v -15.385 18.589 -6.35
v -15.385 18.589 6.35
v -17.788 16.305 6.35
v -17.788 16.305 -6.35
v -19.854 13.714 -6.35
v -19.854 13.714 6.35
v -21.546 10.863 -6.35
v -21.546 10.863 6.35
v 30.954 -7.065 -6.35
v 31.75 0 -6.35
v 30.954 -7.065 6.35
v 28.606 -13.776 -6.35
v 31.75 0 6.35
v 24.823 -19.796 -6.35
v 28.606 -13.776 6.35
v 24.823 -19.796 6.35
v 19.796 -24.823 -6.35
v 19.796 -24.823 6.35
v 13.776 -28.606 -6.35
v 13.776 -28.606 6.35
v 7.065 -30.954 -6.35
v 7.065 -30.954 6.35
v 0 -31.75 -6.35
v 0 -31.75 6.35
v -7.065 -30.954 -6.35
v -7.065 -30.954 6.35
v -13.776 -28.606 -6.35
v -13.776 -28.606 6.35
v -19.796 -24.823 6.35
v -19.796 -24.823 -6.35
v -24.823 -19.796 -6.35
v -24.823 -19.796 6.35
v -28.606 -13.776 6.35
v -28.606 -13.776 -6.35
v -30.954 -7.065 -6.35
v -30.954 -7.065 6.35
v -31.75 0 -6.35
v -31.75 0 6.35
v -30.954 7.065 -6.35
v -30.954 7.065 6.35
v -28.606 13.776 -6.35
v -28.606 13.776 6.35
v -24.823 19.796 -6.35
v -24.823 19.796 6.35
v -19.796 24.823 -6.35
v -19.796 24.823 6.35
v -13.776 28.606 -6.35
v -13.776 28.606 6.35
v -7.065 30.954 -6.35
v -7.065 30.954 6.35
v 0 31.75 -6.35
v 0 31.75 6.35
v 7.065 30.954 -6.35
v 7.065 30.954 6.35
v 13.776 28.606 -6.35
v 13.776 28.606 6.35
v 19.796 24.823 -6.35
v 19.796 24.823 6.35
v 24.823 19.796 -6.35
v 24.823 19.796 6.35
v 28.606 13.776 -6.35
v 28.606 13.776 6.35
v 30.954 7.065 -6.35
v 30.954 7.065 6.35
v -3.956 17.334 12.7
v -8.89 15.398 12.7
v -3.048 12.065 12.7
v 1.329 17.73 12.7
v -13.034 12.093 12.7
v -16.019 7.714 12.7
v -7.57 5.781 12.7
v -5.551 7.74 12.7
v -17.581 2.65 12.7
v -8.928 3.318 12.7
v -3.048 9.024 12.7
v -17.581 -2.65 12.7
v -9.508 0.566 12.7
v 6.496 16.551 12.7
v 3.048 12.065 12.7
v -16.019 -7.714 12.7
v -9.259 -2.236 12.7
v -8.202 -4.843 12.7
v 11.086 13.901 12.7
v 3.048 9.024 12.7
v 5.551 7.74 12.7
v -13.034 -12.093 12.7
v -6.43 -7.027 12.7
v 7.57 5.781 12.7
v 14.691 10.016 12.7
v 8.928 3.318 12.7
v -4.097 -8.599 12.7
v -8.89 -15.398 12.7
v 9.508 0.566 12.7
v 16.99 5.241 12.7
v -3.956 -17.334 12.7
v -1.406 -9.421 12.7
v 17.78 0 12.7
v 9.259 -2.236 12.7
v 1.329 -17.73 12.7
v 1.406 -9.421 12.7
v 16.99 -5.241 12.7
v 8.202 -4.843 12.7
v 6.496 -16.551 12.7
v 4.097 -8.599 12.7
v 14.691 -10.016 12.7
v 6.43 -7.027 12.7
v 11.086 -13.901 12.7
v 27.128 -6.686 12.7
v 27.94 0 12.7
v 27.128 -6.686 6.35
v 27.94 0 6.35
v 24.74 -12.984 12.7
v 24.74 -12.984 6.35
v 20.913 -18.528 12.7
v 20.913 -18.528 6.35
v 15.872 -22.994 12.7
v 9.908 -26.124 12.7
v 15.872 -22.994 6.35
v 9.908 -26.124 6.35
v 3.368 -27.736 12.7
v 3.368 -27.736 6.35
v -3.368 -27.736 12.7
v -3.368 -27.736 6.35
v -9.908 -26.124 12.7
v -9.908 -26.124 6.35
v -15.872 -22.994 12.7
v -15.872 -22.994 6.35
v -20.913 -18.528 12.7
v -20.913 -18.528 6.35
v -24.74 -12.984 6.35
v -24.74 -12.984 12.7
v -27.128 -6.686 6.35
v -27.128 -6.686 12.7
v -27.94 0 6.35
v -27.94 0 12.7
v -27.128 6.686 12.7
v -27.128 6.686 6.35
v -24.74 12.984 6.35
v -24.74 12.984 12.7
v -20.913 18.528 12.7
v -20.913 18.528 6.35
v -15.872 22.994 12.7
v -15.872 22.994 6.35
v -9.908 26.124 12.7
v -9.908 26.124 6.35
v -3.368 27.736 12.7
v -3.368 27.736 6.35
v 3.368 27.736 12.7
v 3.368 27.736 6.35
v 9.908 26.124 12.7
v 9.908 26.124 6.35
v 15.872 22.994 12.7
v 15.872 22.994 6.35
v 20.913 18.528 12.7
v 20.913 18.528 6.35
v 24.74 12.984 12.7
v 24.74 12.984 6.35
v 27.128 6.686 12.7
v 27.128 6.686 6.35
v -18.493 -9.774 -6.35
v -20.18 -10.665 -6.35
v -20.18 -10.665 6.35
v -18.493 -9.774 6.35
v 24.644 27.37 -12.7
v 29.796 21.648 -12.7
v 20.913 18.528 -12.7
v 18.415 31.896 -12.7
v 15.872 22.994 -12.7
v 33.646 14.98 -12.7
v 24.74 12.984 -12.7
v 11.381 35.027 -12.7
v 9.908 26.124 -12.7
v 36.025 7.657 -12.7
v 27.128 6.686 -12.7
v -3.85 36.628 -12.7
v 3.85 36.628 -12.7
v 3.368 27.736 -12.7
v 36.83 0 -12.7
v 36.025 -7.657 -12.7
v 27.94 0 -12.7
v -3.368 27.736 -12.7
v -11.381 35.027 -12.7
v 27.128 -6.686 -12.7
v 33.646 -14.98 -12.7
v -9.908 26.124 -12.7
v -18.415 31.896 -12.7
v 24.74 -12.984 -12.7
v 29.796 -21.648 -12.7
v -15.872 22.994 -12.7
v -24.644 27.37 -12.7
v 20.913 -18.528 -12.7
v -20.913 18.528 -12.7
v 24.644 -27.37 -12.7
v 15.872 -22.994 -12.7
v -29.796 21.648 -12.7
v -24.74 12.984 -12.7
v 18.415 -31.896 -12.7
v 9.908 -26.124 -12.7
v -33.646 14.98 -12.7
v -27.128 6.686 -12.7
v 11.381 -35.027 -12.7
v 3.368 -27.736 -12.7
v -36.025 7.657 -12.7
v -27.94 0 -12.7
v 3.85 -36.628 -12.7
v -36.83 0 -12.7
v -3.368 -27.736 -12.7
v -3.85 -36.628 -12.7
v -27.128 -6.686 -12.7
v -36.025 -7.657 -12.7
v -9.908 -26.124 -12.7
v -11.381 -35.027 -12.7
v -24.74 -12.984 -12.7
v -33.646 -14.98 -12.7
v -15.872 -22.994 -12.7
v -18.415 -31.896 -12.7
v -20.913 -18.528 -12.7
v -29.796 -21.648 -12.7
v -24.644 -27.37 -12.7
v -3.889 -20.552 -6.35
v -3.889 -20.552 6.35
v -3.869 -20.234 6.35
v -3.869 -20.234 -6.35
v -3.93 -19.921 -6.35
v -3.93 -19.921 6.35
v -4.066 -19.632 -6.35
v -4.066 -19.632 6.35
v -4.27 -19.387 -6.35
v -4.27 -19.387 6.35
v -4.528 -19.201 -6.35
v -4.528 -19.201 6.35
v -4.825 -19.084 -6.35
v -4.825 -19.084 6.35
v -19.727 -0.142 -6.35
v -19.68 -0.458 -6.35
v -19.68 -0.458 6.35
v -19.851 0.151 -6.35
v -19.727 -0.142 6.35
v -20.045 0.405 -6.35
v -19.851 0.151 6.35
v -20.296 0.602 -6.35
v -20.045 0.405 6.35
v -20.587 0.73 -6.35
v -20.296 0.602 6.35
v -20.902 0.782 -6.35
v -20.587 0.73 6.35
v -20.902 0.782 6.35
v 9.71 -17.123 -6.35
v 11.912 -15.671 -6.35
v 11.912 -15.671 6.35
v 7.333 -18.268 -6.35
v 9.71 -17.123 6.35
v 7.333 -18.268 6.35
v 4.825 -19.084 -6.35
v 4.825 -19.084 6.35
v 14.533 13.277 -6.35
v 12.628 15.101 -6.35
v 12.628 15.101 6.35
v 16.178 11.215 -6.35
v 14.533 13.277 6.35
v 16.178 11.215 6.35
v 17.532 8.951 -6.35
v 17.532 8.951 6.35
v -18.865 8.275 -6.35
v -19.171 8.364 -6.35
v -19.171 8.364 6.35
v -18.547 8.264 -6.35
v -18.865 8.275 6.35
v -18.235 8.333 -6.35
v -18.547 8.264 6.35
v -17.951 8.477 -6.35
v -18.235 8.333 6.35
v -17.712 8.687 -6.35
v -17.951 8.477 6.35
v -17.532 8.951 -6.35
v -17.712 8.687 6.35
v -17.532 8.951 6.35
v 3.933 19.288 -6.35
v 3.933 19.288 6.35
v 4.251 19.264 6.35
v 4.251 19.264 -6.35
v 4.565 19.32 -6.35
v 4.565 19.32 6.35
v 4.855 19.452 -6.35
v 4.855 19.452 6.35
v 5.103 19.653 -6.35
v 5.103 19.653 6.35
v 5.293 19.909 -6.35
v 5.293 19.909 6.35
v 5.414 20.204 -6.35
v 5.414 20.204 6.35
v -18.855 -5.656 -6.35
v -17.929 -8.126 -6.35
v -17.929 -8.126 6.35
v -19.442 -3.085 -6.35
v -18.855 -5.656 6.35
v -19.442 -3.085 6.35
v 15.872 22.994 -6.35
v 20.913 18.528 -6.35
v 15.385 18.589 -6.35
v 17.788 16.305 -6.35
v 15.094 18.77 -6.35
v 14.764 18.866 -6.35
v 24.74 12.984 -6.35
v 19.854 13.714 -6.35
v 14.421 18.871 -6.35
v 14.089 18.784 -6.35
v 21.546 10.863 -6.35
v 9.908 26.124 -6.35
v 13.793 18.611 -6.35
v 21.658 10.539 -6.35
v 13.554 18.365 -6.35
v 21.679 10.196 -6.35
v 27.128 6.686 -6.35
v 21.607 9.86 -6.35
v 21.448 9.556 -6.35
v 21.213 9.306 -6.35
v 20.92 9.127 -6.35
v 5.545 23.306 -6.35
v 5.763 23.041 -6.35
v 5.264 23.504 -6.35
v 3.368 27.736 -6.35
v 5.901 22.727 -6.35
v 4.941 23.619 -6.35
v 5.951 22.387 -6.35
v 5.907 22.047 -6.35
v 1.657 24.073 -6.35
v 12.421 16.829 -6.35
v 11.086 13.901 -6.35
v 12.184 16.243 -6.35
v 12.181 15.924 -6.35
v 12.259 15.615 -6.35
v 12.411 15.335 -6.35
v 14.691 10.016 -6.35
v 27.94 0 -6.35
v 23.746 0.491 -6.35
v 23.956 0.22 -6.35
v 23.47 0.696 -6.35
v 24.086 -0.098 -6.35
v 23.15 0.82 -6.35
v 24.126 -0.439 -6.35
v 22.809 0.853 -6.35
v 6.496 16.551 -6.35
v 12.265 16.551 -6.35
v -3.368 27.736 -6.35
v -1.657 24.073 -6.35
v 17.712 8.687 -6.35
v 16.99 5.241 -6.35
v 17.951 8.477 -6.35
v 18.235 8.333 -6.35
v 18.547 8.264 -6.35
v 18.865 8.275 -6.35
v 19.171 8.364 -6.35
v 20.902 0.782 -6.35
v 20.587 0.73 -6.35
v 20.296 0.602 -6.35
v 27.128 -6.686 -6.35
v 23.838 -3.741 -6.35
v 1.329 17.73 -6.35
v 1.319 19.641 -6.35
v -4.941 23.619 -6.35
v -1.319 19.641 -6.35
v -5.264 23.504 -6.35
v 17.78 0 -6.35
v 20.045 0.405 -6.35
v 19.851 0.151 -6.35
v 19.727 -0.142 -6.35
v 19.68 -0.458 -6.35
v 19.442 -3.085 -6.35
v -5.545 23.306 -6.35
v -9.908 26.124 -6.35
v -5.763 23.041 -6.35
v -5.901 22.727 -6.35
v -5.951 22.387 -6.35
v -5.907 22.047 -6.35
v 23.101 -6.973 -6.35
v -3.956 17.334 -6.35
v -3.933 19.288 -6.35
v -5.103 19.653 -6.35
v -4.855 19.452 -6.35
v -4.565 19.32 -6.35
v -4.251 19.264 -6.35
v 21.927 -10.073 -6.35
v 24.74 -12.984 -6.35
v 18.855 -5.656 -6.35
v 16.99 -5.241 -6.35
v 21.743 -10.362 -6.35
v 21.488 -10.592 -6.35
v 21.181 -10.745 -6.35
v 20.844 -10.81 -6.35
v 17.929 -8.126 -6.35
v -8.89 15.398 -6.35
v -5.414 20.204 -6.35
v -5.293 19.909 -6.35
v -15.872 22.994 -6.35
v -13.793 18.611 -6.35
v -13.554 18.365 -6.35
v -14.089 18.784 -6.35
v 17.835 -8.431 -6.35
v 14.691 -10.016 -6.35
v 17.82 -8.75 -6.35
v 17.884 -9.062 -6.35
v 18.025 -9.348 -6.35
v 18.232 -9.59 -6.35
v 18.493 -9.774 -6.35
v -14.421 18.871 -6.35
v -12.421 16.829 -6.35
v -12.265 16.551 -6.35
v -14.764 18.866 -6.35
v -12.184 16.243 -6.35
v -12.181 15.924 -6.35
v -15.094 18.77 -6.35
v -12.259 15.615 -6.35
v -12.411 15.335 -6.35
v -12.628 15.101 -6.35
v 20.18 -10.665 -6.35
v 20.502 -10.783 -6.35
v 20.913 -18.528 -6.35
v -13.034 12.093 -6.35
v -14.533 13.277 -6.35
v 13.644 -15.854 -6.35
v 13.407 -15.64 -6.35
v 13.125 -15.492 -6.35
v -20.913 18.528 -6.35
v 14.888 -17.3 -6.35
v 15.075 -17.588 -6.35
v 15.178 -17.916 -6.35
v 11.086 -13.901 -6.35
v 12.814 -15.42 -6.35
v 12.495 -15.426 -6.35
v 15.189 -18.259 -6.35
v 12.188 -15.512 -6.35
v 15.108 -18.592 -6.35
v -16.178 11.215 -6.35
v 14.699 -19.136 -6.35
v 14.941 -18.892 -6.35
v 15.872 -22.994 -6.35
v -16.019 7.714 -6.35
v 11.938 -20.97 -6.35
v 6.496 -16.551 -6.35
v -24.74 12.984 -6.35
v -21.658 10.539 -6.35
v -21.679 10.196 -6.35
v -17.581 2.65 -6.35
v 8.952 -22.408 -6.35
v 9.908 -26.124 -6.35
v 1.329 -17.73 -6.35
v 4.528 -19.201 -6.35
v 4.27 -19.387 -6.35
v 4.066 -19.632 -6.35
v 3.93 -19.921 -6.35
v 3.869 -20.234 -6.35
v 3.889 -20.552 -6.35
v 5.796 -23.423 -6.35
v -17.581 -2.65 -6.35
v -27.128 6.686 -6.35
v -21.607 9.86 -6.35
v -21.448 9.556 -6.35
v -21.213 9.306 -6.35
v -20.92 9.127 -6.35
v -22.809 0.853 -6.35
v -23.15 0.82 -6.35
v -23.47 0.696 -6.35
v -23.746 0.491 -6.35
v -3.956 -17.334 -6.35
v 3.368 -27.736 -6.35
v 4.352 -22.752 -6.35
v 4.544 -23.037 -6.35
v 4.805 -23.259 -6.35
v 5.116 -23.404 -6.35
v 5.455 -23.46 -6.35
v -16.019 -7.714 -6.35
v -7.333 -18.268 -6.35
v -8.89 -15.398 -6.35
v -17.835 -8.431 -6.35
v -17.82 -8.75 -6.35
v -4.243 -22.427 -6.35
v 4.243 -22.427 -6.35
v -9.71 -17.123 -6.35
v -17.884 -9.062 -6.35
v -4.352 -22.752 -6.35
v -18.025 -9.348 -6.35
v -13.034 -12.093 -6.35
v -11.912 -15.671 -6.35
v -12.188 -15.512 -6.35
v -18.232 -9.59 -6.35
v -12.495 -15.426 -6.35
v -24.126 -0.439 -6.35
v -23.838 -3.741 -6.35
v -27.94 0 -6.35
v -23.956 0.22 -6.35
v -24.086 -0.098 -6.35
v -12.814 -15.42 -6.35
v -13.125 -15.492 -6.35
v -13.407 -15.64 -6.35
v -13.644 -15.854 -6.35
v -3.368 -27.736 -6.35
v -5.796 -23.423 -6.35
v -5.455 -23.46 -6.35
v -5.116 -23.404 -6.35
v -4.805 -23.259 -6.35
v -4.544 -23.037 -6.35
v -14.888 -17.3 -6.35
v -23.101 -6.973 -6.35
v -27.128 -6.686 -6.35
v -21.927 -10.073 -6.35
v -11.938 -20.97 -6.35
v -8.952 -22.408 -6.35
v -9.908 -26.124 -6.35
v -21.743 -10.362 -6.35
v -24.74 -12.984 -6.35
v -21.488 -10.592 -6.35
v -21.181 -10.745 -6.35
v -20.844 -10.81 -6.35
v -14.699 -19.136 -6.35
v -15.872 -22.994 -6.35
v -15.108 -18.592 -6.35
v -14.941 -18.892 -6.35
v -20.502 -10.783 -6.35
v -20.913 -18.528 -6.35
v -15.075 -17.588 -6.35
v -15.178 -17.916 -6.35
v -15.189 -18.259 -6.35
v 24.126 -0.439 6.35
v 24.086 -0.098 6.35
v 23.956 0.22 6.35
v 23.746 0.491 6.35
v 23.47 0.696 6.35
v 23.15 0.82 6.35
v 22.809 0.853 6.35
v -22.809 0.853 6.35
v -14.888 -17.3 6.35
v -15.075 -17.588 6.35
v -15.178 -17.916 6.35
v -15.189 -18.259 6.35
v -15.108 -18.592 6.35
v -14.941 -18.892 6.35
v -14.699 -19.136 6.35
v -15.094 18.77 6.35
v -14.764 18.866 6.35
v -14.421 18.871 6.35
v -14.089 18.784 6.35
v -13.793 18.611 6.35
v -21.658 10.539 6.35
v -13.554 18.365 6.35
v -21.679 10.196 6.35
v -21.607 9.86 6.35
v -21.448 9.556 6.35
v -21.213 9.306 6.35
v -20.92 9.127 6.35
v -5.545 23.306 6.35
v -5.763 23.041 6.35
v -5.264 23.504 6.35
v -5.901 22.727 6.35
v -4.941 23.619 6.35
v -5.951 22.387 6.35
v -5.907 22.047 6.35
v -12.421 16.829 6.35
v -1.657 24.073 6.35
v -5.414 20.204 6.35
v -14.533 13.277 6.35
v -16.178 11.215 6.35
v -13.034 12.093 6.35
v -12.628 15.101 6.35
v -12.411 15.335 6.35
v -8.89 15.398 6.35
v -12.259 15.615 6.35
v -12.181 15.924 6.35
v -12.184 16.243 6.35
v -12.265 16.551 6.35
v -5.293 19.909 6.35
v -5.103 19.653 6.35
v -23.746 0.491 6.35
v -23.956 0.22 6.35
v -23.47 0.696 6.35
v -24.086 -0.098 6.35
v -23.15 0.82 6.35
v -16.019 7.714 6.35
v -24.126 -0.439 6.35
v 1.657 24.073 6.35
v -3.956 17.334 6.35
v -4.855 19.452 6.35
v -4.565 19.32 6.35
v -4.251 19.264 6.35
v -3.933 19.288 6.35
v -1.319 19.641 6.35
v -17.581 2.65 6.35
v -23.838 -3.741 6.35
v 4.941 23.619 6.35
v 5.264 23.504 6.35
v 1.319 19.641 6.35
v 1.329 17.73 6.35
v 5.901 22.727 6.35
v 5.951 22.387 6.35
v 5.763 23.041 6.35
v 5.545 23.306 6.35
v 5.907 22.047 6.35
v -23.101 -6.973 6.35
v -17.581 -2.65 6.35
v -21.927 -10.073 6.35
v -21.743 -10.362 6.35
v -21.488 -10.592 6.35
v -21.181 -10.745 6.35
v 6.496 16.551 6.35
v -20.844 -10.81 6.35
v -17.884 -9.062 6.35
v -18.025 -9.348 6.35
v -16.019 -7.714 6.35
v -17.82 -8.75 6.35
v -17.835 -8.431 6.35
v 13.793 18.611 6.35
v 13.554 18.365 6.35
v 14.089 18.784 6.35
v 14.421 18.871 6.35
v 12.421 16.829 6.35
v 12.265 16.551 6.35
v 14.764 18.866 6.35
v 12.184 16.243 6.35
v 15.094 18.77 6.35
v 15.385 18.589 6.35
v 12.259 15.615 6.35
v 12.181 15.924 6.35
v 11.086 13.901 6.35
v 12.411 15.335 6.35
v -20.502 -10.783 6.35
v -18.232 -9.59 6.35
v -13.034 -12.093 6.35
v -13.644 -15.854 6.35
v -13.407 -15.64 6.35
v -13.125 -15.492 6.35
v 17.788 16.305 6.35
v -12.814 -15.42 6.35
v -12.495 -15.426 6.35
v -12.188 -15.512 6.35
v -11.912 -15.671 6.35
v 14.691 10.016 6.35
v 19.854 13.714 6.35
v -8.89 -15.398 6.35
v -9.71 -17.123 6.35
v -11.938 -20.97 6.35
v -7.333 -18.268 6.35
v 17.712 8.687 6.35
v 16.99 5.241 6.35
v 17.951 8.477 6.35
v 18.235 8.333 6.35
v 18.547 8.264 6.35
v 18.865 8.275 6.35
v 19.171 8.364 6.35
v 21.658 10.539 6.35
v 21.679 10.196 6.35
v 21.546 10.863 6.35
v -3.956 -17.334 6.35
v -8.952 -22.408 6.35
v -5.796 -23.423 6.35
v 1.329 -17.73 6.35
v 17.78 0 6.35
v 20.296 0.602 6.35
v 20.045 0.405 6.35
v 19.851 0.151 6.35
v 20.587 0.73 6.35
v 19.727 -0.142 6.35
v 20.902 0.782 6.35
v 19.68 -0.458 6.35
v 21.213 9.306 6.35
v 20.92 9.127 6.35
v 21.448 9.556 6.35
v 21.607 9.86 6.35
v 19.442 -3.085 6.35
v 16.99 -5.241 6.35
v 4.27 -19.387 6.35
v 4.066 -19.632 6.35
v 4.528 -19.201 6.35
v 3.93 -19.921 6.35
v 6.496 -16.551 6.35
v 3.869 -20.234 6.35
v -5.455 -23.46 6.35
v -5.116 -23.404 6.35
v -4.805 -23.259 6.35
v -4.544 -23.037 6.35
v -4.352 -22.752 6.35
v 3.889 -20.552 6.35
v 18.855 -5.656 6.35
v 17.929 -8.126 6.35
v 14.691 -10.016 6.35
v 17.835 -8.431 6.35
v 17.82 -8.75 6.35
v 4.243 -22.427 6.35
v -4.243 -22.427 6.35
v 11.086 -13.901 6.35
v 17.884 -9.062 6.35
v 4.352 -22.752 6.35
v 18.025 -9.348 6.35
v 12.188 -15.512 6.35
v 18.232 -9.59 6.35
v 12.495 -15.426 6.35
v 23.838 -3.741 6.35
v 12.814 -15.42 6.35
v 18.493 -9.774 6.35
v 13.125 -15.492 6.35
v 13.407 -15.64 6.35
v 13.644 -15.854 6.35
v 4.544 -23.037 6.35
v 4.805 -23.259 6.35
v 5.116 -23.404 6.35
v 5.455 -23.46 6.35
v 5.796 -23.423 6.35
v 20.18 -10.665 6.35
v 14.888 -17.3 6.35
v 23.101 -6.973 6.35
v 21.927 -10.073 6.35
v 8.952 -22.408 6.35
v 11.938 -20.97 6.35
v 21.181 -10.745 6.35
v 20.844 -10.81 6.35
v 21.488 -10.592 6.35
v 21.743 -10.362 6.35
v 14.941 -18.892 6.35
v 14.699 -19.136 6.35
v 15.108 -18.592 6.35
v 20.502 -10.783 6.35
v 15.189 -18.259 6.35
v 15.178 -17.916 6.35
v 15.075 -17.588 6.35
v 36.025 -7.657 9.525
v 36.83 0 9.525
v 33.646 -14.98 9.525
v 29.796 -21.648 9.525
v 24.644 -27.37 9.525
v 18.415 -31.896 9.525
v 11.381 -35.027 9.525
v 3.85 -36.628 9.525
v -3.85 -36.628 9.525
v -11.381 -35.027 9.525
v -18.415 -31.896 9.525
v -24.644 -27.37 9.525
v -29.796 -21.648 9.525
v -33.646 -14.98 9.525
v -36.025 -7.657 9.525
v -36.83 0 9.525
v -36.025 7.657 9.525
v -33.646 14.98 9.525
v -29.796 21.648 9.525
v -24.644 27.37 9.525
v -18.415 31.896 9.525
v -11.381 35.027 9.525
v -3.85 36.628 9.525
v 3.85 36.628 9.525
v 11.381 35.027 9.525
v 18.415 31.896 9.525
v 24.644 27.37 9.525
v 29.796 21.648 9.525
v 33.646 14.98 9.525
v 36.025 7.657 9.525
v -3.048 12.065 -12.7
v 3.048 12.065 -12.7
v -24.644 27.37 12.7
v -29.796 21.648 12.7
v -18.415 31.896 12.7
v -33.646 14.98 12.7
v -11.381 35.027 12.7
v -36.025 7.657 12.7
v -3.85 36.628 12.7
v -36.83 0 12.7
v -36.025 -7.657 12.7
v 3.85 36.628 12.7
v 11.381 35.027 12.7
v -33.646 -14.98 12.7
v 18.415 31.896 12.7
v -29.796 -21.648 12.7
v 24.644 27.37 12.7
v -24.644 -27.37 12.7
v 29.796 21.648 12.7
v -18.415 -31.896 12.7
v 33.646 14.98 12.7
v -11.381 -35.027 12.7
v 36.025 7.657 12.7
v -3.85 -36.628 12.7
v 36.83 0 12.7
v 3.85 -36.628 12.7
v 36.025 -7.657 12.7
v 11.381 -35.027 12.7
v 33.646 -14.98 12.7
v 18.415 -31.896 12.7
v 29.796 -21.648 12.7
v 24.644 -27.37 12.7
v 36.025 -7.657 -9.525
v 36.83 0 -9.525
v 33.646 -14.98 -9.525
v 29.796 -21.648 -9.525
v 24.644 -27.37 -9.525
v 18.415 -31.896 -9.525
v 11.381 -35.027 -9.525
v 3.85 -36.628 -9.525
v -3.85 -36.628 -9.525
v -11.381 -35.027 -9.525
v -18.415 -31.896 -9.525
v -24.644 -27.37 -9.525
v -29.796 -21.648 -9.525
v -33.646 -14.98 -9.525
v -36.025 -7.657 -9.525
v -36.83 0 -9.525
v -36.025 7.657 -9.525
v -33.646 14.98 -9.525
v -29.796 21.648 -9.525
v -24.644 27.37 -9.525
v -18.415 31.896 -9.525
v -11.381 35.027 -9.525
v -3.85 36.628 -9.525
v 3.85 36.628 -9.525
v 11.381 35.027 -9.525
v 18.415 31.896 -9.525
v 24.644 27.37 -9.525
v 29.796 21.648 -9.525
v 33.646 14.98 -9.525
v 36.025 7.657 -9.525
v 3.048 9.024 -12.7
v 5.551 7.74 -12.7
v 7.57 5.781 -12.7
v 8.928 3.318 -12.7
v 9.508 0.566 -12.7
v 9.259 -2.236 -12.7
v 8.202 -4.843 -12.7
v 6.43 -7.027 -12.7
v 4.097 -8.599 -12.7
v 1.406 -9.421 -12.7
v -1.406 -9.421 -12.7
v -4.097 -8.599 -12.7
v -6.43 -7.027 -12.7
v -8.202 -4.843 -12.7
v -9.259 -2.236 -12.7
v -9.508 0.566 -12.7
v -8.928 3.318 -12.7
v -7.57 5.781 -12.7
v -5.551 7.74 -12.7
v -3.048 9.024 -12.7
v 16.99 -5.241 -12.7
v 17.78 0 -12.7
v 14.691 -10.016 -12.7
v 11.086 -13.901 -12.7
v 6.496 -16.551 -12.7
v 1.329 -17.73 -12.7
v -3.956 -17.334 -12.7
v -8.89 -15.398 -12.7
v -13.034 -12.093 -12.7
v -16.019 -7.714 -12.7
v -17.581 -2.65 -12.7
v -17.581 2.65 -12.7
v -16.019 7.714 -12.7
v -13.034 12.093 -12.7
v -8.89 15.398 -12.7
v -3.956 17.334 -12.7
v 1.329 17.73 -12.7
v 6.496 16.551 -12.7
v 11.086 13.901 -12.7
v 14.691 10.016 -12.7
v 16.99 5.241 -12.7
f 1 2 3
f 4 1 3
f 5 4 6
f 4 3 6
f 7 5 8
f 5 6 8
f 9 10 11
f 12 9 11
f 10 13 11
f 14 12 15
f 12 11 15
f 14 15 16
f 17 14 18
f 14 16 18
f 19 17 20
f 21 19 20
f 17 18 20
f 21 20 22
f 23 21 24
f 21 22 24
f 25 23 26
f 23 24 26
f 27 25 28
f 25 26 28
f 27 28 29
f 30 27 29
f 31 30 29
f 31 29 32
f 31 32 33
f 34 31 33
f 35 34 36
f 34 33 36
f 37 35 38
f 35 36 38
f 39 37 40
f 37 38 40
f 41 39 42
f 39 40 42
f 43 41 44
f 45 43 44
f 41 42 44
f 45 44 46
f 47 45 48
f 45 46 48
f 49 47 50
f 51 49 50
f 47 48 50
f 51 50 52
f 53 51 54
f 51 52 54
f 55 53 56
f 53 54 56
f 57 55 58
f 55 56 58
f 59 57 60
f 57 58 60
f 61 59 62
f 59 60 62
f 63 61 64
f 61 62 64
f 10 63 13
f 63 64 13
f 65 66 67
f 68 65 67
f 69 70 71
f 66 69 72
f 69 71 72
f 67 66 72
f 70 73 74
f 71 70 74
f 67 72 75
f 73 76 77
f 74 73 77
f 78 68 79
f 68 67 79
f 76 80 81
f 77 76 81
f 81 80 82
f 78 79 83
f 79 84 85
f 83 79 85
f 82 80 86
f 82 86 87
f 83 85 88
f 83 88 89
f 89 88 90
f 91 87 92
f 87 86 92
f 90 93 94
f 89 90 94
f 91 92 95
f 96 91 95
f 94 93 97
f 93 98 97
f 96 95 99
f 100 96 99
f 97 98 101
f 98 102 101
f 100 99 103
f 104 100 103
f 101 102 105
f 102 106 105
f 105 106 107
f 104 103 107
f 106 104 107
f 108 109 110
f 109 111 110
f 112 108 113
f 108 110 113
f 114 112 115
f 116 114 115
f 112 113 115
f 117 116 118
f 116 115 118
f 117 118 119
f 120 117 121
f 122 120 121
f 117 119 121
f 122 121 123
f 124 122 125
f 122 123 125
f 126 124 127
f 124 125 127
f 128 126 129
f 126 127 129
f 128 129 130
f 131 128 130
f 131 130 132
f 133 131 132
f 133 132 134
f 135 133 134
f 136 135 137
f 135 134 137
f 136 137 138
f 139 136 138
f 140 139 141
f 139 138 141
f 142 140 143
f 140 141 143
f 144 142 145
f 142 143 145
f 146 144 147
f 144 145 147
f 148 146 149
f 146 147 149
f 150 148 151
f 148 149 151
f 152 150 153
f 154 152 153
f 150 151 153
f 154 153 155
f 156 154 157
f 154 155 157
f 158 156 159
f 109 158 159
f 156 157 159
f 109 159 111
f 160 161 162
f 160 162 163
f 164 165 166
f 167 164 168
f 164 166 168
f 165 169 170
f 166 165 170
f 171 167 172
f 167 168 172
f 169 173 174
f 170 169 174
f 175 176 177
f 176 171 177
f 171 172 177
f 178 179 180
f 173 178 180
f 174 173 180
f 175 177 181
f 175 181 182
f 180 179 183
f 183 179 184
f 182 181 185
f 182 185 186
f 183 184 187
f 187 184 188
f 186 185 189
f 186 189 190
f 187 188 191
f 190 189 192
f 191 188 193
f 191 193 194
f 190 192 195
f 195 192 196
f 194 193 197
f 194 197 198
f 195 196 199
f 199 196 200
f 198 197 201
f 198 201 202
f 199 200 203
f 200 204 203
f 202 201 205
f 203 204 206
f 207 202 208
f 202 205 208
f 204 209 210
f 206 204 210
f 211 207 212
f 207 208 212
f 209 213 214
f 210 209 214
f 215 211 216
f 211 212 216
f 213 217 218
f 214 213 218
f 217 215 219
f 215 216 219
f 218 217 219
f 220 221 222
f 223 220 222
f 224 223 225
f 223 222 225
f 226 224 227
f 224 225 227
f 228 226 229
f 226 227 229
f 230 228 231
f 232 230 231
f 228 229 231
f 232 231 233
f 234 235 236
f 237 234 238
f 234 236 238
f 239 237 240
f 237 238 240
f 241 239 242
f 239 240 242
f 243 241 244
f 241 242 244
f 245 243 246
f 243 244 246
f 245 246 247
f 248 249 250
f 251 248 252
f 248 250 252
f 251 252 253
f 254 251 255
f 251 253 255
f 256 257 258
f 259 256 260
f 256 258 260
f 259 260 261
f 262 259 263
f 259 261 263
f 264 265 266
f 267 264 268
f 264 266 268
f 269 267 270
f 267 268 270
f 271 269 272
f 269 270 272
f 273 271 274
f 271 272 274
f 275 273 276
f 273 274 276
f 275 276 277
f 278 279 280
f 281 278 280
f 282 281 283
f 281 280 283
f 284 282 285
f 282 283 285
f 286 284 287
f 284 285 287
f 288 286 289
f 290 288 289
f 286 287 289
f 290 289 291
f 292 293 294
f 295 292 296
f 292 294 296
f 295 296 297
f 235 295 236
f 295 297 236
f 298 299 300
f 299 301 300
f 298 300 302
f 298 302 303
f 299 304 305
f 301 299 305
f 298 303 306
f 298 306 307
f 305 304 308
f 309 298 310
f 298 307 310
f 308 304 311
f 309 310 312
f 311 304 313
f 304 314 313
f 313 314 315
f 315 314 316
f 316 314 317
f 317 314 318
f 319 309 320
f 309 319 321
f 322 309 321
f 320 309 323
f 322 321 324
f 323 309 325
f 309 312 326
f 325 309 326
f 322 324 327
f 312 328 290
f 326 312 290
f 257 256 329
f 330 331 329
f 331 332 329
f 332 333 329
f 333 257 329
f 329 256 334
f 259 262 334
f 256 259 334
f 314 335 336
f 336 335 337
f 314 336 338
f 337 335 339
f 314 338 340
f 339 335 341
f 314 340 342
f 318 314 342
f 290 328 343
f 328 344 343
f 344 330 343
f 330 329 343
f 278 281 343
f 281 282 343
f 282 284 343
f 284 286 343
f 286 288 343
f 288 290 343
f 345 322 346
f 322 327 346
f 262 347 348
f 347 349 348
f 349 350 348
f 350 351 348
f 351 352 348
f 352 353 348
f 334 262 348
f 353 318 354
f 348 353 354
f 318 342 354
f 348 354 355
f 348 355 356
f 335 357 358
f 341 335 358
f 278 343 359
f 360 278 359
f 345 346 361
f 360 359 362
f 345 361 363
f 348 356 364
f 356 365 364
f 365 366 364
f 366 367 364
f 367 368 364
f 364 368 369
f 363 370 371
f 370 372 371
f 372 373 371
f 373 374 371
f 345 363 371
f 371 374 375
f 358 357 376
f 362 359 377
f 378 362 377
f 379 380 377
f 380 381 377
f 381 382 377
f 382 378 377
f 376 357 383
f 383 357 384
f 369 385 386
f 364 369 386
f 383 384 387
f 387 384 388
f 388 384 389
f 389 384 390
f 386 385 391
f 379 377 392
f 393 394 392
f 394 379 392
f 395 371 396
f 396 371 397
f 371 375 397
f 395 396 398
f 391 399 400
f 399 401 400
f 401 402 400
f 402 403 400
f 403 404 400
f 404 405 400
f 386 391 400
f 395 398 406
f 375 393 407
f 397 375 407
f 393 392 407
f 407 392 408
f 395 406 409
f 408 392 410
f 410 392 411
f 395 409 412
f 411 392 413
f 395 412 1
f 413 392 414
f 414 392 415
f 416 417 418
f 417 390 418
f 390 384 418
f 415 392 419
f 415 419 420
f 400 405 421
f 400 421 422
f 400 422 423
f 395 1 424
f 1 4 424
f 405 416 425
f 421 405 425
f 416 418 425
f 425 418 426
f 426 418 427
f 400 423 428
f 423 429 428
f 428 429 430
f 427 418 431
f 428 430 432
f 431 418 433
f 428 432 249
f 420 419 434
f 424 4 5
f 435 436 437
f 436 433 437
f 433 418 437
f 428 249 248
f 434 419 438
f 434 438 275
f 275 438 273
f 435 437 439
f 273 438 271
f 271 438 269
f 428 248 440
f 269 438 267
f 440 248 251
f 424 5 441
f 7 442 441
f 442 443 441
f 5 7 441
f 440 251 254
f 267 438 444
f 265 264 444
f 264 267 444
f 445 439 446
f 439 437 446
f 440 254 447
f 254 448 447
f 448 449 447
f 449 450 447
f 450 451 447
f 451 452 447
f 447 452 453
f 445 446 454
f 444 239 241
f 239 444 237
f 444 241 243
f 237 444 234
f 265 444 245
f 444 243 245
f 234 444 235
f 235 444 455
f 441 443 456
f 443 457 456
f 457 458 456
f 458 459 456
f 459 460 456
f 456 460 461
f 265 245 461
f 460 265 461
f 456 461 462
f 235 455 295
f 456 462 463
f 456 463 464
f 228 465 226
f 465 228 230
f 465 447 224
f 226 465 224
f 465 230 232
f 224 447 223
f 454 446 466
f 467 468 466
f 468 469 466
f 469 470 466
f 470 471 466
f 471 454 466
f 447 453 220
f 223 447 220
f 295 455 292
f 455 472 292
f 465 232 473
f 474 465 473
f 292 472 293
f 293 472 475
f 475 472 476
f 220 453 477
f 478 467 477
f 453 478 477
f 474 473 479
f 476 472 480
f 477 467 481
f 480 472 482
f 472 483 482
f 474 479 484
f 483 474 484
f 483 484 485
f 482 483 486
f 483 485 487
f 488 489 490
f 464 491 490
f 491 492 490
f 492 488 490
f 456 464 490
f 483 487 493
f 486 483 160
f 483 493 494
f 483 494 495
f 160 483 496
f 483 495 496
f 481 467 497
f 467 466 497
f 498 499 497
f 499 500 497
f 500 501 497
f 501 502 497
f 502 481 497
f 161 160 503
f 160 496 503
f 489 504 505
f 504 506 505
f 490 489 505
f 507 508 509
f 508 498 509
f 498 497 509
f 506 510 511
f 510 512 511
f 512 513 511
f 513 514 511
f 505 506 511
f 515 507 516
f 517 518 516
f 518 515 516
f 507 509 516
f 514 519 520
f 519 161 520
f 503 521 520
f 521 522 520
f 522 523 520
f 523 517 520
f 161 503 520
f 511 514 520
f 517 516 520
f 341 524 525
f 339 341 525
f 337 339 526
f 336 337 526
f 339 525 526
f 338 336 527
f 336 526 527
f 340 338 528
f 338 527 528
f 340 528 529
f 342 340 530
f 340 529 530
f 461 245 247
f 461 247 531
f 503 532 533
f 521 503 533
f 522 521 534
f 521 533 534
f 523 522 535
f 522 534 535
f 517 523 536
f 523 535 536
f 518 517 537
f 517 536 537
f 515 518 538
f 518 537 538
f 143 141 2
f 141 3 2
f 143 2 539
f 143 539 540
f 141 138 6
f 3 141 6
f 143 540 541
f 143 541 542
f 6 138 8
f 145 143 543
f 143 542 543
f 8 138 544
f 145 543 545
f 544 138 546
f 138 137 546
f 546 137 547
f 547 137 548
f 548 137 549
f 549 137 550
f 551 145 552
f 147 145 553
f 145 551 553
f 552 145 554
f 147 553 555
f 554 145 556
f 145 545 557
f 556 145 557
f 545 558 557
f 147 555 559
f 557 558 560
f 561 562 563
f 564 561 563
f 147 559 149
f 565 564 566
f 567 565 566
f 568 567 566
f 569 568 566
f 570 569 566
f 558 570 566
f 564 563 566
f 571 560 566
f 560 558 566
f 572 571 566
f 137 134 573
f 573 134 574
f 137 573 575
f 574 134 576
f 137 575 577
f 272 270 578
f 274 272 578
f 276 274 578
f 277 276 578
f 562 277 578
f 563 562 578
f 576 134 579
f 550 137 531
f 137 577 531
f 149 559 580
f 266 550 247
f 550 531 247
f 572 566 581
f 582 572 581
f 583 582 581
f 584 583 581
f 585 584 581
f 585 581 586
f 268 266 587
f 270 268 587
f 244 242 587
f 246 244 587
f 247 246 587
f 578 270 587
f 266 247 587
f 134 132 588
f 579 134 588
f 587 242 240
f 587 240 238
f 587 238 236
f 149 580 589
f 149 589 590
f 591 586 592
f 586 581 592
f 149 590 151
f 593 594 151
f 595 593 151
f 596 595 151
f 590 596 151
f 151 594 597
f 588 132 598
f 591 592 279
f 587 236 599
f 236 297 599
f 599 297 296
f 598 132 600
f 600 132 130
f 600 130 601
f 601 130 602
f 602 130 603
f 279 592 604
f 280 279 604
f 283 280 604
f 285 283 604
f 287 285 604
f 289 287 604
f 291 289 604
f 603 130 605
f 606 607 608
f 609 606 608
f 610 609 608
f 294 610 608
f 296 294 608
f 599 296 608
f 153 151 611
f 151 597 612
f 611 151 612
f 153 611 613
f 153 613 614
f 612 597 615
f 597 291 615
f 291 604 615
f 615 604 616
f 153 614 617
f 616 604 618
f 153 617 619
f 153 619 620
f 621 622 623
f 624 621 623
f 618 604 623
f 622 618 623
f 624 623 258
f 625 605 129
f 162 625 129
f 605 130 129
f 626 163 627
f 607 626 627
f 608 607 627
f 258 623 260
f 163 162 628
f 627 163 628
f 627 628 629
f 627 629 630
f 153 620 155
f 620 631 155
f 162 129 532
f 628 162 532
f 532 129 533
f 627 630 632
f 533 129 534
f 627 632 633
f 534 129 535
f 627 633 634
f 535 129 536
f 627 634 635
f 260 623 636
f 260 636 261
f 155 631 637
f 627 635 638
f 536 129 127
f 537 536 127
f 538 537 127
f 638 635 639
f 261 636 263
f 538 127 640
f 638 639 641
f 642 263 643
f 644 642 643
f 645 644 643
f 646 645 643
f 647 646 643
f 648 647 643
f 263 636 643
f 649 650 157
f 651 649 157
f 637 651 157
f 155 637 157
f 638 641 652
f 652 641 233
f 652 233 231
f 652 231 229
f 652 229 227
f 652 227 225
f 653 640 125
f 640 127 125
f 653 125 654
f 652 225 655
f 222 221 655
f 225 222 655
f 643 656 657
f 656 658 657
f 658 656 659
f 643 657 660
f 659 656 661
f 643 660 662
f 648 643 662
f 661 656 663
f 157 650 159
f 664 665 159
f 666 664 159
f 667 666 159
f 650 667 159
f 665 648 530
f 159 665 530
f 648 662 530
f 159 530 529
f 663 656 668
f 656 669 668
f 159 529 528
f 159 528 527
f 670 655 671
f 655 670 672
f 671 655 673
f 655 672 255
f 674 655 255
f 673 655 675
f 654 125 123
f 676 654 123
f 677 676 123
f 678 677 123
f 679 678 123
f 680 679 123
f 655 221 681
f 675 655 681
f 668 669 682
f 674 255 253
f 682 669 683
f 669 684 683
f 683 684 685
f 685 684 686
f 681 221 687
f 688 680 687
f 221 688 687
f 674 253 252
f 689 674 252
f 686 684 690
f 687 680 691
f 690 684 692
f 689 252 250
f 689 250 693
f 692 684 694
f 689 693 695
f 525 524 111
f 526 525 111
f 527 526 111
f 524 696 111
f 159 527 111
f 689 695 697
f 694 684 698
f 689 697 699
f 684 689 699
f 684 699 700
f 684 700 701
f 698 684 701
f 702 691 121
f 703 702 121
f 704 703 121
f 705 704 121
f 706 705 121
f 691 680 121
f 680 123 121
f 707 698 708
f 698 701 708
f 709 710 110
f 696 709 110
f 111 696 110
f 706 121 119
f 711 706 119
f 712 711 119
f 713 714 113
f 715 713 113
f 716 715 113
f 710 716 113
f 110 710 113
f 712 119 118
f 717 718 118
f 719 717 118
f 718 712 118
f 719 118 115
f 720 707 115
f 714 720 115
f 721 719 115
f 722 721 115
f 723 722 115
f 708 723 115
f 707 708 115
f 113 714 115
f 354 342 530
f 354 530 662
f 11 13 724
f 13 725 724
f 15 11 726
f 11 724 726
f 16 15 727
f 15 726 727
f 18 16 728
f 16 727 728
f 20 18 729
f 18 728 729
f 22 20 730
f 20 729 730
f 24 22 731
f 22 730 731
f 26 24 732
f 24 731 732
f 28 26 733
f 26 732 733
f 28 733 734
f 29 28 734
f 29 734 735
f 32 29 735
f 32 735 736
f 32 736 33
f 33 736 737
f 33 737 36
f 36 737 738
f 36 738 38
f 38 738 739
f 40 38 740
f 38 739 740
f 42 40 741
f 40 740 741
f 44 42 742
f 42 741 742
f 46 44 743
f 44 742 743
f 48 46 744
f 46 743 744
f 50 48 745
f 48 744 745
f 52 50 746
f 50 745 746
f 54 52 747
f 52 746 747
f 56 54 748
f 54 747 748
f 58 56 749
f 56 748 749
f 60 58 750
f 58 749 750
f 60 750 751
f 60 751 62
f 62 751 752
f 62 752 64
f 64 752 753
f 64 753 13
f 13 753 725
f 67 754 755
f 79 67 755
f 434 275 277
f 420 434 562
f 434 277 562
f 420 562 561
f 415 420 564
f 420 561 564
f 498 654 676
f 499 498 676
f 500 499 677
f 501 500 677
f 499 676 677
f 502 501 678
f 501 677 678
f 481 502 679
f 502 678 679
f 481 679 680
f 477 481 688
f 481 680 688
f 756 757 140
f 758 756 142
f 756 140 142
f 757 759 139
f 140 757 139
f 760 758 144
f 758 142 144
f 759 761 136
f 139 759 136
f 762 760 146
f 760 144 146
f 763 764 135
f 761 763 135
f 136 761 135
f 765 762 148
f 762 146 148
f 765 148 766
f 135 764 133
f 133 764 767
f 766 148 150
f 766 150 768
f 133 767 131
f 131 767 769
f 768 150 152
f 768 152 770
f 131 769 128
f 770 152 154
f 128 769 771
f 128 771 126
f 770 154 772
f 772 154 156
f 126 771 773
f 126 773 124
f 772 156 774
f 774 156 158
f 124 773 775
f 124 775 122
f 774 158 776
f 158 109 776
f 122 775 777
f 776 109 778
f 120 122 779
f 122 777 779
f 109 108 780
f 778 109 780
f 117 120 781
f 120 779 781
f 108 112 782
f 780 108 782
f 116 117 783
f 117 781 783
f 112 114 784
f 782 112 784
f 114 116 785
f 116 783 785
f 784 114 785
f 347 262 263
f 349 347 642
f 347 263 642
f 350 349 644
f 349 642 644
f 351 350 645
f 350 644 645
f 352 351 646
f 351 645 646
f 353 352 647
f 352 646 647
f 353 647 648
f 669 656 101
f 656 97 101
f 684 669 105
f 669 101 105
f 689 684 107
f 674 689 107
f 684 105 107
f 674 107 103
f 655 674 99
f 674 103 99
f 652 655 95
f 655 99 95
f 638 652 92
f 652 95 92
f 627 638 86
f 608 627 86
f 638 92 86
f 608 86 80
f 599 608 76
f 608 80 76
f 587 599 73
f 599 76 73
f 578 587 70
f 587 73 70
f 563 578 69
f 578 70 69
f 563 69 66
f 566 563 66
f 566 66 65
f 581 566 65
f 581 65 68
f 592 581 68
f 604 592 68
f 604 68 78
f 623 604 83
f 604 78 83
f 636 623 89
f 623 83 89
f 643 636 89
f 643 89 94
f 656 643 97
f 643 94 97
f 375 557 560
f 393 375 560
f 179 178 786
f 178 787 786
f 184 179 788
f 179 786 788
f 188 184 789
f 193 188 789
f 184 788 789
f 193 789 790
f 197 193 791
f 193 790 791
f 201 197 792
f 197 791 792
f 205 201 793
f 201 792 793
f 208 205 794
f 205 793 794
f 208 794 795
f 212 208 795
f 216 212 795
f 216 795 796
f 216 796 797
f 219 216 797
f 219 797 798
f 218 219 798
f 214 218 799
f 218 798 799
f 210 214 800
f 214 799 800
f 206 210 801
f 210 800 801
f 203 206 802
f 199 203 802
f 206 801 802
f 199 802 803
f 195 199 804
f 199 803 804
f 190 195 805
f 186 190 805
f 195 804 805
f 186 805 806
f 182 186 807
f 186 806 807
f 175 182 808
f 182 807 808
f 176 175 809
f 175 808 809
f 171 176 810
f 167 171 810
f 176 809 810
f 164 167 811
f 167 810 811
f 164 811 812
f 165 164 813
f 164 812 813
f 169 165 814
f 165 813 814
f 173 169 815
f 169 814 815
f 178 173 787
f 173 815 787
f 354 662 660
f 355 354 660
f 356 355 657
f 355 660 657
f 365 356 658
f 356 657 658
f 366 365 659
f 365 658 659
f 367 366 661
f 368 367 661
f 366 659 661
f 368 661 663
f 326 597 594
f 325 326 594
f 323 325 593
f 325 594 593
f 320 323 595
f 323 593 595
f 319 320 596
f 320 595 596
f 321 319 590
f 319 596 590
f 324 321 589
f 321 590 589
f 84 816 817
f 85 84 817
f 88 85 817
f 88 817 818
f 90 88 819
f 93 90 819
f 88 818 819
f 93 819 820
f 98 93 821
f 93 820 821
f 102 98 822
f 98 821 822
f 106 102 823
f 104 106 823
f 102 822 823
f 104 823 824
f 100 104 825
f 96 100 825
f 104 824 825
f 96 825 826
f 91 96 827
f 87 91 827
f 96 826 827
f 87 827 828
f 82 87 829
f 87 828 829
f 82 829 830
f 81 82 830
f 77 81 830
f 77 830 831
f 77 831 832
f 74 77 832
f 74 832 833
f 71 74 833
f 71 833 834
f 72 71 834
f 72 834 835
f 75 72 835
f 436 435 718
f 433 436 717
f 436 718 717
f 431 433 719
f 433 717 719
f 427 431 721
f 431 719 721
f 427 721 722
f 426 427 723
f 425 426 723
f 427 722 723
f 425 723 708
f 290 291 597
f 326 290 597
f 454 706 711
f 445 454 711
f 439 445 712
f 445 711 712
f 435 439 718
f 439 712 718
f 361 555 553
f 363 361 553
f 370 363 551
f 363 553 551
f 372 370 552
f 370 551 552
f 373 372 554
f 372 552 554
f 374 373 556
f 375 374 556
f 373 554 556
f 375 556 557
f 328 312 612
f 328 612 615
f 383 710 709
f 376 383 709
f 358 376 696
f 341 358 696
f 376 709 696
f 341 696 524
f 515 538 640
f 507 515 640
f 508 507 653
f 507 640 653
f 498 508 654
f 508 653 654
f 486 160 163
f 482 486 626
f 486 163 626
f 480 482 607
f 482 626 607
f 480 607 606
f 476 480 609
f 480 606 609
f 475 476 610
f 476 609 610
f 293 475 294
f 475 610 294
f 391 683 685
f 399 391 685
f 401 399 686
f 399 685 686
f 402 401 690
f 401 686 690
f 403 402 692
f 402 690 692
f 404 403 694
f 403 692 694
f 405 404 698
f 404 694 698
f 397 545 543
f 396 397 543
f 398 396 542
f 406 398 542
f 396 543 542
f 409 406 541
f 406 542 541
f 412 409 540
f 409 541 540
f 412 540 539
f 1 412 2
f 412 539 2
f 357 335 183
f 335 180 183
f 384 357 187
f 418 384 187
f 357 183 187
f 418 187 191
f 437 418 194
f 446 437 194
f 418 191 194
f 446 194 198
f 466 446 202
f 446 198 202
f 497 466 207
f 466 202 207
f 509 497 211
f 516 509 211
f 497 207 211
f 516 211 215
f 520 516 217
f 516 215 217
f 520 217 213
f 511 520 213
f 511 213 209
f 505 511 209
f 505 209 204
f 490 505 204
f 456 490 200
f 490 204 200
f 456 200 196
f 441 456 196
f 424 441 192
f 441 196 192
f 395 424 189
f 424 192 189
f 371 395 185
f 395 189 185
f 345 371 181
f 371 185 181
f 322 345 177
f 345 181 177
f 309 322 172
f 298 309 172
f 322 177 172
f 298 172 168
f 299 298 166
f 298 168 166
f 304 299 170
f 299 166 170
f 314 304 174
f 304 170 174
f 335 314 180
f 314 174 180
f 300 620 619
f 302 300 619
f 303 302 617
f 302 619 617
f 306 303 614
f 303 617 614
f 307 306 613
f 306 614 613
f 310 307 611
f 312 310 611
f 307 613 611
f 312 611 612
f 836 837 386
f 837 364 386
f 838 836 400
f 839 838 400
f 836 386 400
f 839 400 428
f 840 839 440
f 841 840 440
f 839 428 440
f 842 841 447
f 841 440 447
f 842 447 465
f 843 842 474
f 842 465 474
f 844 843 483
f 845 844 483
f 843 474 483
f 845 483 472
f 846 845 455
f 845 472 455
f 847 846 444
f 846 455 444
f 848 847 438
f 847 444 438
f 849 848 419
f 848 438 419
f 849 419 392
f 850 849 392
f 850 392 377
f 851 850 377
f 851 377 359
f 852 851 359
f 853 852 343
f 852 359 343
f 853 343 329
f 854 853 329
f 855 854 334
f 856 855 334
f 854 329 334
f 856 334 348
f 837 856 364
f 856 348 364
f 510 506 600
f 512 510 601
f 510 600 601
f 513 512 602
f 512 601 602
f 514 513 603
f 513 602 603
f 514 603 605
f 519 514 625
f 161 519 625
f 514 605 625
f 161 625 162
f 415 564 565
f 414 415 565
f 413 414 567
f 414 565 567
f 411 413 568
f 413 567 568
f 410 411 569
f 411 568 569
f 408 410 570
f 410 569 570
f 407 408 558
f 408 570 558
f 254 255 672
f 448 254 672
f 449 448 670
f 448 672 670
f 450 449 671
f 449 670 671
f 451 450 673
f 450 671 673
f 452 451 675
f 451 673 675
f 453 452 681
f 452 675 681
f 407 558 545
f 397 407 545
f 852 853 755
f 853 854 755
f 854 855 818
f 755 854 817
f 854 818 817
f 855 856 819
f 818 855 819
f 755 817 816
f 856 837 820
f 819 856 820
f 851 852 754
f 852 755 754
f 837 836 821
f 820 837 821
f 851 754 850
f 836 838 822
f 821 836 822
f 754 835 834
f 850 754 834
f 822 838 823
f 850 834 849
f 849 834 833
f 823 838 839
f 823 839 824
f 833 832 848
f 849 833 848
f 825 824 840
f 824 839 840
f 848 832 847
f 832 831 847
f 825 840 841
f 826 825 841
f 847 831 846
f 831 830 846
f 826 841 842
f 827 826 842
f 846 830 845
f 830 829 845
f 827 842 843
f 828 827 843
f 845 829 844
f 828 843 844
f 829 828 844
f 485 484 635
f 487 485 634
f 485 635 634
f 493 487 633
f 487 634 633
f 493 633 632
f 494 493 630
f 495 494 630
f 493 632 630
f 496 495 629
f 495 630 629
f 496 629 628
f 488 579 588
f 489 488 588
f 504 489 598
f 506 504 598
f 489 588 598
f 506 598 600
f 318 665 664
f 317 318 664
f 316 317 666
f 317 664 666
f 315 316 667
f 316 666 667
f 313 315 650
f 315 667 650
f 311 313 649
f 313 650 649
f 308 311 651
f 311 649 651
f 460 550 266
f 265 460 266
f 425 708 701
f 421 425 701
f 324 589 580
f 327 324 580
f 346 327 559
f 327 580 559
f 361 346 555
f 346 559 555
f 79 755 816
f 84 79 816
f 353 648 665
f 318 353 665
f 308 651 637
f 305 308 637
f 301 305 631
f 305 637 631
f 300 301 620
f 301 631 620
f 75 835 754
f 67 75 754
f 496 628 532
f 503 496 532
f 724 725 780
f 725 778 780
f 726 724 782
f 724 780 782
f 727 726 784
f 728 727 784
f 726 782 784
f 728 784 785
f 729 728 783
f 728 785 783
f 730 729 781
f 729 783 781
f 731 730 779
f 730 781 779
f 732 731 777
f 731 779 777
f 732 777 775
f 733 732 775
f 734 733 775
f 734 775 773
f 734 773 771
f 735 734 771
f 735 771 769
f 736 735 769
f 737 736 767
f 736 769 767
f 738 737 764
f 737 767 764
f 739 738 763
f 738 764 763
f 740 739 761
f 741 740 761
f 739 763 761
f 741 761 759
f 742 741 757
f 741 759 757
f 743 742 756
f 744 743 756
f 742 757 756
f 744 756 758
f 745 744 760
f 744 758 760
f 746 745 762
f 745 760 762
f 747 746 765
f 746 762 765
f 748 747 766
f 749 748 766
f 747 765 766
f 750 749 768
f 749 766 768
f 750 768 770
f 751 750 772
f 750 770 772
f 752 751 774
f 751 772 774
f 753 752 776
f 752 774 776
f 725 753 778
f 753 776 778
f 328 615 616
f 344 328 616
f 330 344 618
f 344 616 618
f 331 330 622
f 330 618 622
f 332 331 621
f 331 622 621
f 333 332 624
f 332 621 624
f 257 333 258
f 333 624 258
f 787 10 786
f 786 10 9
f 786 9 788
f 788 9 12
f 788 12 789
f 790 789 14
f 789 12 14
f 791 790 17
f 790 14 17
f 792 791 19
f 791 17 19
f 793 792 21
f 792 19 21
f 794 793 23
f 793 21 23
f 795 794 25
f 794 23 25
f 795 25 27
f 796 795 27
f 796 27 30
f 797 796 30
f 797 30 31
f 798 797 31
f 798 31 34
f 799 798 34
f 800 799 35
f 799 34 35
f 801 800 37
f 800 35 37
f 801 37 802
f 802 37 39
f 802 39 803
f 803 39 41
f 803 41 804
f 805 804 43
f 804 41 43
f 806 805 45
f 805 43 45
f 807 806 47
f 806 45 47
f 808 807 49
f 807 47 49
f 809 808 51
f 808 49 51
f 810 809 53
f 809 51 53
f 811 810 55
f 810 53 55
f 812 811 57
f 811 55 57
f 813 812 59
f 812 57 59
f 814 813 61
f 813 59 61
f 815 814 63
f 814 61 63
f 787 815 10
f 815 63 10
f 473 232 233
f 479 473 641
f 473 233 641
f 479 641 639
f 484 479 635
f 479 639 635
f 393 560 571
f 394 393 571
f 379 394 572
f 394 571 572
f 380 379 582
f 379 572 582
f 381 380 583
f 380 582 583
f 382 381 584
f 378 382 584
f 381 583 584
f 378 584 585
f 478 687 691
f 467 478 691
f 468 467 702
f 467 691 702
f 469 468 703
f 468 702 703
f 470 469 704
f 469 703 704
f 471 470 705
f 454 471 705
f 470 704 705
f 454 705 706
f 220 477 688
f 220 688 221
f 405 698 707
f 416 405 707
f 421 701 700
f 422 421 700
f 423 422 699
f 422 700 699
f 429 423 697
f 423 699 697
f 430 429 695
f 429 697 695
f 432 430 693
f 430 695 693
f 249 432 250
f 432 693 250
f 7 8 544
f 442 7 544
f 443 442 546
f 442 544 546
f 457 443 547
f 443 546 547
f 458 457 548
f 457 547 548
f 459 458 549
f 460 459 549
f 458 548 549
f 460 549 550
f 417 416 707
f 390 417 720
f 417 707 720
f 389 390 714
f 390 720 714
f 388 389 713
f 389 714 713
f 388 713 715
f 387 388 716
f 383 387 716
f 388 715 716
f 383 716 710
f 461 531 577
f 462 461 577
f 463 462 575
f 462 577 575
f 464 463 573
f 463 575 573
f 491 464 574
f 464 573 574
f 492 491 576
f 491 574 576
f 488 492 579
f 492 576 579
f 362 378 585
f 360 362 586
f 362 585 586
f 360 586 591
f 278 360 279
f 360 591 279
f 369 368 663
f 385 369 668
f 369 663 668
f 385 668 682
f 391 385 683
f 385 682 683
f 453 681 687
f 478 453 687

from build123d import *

# Parameters (mm, degrees)
CUT_EXTRUDE1_DEPTH      = 58.948751496
CUT_EXTRUDE1_DEPTH_BACK = 58.948751496
CUT_EXTRUDE2_DEPTH      = 56.459898125
CIRPATTERN1_COUNT       = 7


with BuildPart() as part:
    # Sketch2 → Revolve3 (revolve)
    with BuildSketch(Plane(origin=(0, 0, 0), x_dir=(0, 0, -1), z_dir=(1, 0, 0)), mode=Mode.PRIVATE) as revolve3_sk:
        Polygon((12.7, 0), (12.7, 17.78), (6.35, 17.78), (6.35, 27.94), (12.7, 27.94), (12.7, 36.83), (9.525, 36.83), (6.35, 31.75), (-6.35, 31.75), (-9.525, 36.83), (-12.7, 36.83), (-12.7, 27.94), (-6.35, 27.94), (-6.35, 17.78), (-12.7, 17.78), (-12.7, 0), align=None)
    revolve(revolve3_sk.sketch.rotate(Axis((0, 0, 0), (0, 0, -1)), 90), axis=Axis((0, 0, 0), (0, 0, -1)))

    # Sketch3 → Cut-Extrude1 (cut, two sides: drawn at the far end of the back side and taken through both)
    with BuildSketch(Plane.XY.offset(12.7).offset(-CUT_EXTRUDE1_DEPTH_BACK)):
        with BuildLine():
            Line((-3.048, 12.065), (3.048, 12.065))
            Line((3.048, 12.065), (3.048, 9.024152093))
            ThreePointArc((3.048, 9.024152093), (0, -9.525), (-3.048, 9.024152093))
            Line((-3.048, 9.024152093), (-3.048, 12.065))
        make_face()
    extrude(amount=CUT_EXTRUDE1_DEPTH + CUT_EXTRUDE1_DEPTH_BACK, mode=Mode.SUBTRACT)

    # Sketch4 → Cut-Extrude2 (cut, through all)
    with BuildSketch(Plane.XY.offset(6.35)):
        with BuildLine():
            Line((-5.907465754, 22.046962339), (-5.413583315, 20.203767983))
            ThreePointArc((-5.413583315, 20.203767983), (-4.854909812, 19.452372744), (-3.933108575, 19.28807616))
            ThreePointArc((-3.933108575, 19.28807616), (0, 19.685), (3.933108575, 19.28807616))
            ThreePointArc((3.933108575, 19.28807616), (4.854909812, 19.452372744), (5.413583315, 20.203767983))
            Line((5.413583315, 20.203767983), (5.907465754, 22.046962339))
            ThreePointArc((5.907465754, 22.046962339), (5.762521779, 23.040980559), (4.940781063, 23.618754889))
            ThreePointArc((4.940781063, 23.618754889), (0, 24.13), (-4.940781063, 23.618754889))
            ThreePointArc((-4.940781063, 23.618754889), (-5.762521779, 23.040980559), (-5.907465754, 22.046962339))
        make_face()
    cut_extrude2 = extrude(amount=-CUT_EXTRUDE2_DEPTH, mode=Mode.SUBTRACT)

    # CirPattern1: Cut-Extrude2 ×7 about axis
    cirpattern1_axis = Axis((0, 0, 0), (0, 0, 1))
    for i in range(1, CIRPATTERN1_COUNT):
        add(cut_extrude2.rotate(cirpattern1_axis, i * 360 / CIRPATTERN1_COUNT), mode=Mode.SUBTRACT)


solid = part.part
